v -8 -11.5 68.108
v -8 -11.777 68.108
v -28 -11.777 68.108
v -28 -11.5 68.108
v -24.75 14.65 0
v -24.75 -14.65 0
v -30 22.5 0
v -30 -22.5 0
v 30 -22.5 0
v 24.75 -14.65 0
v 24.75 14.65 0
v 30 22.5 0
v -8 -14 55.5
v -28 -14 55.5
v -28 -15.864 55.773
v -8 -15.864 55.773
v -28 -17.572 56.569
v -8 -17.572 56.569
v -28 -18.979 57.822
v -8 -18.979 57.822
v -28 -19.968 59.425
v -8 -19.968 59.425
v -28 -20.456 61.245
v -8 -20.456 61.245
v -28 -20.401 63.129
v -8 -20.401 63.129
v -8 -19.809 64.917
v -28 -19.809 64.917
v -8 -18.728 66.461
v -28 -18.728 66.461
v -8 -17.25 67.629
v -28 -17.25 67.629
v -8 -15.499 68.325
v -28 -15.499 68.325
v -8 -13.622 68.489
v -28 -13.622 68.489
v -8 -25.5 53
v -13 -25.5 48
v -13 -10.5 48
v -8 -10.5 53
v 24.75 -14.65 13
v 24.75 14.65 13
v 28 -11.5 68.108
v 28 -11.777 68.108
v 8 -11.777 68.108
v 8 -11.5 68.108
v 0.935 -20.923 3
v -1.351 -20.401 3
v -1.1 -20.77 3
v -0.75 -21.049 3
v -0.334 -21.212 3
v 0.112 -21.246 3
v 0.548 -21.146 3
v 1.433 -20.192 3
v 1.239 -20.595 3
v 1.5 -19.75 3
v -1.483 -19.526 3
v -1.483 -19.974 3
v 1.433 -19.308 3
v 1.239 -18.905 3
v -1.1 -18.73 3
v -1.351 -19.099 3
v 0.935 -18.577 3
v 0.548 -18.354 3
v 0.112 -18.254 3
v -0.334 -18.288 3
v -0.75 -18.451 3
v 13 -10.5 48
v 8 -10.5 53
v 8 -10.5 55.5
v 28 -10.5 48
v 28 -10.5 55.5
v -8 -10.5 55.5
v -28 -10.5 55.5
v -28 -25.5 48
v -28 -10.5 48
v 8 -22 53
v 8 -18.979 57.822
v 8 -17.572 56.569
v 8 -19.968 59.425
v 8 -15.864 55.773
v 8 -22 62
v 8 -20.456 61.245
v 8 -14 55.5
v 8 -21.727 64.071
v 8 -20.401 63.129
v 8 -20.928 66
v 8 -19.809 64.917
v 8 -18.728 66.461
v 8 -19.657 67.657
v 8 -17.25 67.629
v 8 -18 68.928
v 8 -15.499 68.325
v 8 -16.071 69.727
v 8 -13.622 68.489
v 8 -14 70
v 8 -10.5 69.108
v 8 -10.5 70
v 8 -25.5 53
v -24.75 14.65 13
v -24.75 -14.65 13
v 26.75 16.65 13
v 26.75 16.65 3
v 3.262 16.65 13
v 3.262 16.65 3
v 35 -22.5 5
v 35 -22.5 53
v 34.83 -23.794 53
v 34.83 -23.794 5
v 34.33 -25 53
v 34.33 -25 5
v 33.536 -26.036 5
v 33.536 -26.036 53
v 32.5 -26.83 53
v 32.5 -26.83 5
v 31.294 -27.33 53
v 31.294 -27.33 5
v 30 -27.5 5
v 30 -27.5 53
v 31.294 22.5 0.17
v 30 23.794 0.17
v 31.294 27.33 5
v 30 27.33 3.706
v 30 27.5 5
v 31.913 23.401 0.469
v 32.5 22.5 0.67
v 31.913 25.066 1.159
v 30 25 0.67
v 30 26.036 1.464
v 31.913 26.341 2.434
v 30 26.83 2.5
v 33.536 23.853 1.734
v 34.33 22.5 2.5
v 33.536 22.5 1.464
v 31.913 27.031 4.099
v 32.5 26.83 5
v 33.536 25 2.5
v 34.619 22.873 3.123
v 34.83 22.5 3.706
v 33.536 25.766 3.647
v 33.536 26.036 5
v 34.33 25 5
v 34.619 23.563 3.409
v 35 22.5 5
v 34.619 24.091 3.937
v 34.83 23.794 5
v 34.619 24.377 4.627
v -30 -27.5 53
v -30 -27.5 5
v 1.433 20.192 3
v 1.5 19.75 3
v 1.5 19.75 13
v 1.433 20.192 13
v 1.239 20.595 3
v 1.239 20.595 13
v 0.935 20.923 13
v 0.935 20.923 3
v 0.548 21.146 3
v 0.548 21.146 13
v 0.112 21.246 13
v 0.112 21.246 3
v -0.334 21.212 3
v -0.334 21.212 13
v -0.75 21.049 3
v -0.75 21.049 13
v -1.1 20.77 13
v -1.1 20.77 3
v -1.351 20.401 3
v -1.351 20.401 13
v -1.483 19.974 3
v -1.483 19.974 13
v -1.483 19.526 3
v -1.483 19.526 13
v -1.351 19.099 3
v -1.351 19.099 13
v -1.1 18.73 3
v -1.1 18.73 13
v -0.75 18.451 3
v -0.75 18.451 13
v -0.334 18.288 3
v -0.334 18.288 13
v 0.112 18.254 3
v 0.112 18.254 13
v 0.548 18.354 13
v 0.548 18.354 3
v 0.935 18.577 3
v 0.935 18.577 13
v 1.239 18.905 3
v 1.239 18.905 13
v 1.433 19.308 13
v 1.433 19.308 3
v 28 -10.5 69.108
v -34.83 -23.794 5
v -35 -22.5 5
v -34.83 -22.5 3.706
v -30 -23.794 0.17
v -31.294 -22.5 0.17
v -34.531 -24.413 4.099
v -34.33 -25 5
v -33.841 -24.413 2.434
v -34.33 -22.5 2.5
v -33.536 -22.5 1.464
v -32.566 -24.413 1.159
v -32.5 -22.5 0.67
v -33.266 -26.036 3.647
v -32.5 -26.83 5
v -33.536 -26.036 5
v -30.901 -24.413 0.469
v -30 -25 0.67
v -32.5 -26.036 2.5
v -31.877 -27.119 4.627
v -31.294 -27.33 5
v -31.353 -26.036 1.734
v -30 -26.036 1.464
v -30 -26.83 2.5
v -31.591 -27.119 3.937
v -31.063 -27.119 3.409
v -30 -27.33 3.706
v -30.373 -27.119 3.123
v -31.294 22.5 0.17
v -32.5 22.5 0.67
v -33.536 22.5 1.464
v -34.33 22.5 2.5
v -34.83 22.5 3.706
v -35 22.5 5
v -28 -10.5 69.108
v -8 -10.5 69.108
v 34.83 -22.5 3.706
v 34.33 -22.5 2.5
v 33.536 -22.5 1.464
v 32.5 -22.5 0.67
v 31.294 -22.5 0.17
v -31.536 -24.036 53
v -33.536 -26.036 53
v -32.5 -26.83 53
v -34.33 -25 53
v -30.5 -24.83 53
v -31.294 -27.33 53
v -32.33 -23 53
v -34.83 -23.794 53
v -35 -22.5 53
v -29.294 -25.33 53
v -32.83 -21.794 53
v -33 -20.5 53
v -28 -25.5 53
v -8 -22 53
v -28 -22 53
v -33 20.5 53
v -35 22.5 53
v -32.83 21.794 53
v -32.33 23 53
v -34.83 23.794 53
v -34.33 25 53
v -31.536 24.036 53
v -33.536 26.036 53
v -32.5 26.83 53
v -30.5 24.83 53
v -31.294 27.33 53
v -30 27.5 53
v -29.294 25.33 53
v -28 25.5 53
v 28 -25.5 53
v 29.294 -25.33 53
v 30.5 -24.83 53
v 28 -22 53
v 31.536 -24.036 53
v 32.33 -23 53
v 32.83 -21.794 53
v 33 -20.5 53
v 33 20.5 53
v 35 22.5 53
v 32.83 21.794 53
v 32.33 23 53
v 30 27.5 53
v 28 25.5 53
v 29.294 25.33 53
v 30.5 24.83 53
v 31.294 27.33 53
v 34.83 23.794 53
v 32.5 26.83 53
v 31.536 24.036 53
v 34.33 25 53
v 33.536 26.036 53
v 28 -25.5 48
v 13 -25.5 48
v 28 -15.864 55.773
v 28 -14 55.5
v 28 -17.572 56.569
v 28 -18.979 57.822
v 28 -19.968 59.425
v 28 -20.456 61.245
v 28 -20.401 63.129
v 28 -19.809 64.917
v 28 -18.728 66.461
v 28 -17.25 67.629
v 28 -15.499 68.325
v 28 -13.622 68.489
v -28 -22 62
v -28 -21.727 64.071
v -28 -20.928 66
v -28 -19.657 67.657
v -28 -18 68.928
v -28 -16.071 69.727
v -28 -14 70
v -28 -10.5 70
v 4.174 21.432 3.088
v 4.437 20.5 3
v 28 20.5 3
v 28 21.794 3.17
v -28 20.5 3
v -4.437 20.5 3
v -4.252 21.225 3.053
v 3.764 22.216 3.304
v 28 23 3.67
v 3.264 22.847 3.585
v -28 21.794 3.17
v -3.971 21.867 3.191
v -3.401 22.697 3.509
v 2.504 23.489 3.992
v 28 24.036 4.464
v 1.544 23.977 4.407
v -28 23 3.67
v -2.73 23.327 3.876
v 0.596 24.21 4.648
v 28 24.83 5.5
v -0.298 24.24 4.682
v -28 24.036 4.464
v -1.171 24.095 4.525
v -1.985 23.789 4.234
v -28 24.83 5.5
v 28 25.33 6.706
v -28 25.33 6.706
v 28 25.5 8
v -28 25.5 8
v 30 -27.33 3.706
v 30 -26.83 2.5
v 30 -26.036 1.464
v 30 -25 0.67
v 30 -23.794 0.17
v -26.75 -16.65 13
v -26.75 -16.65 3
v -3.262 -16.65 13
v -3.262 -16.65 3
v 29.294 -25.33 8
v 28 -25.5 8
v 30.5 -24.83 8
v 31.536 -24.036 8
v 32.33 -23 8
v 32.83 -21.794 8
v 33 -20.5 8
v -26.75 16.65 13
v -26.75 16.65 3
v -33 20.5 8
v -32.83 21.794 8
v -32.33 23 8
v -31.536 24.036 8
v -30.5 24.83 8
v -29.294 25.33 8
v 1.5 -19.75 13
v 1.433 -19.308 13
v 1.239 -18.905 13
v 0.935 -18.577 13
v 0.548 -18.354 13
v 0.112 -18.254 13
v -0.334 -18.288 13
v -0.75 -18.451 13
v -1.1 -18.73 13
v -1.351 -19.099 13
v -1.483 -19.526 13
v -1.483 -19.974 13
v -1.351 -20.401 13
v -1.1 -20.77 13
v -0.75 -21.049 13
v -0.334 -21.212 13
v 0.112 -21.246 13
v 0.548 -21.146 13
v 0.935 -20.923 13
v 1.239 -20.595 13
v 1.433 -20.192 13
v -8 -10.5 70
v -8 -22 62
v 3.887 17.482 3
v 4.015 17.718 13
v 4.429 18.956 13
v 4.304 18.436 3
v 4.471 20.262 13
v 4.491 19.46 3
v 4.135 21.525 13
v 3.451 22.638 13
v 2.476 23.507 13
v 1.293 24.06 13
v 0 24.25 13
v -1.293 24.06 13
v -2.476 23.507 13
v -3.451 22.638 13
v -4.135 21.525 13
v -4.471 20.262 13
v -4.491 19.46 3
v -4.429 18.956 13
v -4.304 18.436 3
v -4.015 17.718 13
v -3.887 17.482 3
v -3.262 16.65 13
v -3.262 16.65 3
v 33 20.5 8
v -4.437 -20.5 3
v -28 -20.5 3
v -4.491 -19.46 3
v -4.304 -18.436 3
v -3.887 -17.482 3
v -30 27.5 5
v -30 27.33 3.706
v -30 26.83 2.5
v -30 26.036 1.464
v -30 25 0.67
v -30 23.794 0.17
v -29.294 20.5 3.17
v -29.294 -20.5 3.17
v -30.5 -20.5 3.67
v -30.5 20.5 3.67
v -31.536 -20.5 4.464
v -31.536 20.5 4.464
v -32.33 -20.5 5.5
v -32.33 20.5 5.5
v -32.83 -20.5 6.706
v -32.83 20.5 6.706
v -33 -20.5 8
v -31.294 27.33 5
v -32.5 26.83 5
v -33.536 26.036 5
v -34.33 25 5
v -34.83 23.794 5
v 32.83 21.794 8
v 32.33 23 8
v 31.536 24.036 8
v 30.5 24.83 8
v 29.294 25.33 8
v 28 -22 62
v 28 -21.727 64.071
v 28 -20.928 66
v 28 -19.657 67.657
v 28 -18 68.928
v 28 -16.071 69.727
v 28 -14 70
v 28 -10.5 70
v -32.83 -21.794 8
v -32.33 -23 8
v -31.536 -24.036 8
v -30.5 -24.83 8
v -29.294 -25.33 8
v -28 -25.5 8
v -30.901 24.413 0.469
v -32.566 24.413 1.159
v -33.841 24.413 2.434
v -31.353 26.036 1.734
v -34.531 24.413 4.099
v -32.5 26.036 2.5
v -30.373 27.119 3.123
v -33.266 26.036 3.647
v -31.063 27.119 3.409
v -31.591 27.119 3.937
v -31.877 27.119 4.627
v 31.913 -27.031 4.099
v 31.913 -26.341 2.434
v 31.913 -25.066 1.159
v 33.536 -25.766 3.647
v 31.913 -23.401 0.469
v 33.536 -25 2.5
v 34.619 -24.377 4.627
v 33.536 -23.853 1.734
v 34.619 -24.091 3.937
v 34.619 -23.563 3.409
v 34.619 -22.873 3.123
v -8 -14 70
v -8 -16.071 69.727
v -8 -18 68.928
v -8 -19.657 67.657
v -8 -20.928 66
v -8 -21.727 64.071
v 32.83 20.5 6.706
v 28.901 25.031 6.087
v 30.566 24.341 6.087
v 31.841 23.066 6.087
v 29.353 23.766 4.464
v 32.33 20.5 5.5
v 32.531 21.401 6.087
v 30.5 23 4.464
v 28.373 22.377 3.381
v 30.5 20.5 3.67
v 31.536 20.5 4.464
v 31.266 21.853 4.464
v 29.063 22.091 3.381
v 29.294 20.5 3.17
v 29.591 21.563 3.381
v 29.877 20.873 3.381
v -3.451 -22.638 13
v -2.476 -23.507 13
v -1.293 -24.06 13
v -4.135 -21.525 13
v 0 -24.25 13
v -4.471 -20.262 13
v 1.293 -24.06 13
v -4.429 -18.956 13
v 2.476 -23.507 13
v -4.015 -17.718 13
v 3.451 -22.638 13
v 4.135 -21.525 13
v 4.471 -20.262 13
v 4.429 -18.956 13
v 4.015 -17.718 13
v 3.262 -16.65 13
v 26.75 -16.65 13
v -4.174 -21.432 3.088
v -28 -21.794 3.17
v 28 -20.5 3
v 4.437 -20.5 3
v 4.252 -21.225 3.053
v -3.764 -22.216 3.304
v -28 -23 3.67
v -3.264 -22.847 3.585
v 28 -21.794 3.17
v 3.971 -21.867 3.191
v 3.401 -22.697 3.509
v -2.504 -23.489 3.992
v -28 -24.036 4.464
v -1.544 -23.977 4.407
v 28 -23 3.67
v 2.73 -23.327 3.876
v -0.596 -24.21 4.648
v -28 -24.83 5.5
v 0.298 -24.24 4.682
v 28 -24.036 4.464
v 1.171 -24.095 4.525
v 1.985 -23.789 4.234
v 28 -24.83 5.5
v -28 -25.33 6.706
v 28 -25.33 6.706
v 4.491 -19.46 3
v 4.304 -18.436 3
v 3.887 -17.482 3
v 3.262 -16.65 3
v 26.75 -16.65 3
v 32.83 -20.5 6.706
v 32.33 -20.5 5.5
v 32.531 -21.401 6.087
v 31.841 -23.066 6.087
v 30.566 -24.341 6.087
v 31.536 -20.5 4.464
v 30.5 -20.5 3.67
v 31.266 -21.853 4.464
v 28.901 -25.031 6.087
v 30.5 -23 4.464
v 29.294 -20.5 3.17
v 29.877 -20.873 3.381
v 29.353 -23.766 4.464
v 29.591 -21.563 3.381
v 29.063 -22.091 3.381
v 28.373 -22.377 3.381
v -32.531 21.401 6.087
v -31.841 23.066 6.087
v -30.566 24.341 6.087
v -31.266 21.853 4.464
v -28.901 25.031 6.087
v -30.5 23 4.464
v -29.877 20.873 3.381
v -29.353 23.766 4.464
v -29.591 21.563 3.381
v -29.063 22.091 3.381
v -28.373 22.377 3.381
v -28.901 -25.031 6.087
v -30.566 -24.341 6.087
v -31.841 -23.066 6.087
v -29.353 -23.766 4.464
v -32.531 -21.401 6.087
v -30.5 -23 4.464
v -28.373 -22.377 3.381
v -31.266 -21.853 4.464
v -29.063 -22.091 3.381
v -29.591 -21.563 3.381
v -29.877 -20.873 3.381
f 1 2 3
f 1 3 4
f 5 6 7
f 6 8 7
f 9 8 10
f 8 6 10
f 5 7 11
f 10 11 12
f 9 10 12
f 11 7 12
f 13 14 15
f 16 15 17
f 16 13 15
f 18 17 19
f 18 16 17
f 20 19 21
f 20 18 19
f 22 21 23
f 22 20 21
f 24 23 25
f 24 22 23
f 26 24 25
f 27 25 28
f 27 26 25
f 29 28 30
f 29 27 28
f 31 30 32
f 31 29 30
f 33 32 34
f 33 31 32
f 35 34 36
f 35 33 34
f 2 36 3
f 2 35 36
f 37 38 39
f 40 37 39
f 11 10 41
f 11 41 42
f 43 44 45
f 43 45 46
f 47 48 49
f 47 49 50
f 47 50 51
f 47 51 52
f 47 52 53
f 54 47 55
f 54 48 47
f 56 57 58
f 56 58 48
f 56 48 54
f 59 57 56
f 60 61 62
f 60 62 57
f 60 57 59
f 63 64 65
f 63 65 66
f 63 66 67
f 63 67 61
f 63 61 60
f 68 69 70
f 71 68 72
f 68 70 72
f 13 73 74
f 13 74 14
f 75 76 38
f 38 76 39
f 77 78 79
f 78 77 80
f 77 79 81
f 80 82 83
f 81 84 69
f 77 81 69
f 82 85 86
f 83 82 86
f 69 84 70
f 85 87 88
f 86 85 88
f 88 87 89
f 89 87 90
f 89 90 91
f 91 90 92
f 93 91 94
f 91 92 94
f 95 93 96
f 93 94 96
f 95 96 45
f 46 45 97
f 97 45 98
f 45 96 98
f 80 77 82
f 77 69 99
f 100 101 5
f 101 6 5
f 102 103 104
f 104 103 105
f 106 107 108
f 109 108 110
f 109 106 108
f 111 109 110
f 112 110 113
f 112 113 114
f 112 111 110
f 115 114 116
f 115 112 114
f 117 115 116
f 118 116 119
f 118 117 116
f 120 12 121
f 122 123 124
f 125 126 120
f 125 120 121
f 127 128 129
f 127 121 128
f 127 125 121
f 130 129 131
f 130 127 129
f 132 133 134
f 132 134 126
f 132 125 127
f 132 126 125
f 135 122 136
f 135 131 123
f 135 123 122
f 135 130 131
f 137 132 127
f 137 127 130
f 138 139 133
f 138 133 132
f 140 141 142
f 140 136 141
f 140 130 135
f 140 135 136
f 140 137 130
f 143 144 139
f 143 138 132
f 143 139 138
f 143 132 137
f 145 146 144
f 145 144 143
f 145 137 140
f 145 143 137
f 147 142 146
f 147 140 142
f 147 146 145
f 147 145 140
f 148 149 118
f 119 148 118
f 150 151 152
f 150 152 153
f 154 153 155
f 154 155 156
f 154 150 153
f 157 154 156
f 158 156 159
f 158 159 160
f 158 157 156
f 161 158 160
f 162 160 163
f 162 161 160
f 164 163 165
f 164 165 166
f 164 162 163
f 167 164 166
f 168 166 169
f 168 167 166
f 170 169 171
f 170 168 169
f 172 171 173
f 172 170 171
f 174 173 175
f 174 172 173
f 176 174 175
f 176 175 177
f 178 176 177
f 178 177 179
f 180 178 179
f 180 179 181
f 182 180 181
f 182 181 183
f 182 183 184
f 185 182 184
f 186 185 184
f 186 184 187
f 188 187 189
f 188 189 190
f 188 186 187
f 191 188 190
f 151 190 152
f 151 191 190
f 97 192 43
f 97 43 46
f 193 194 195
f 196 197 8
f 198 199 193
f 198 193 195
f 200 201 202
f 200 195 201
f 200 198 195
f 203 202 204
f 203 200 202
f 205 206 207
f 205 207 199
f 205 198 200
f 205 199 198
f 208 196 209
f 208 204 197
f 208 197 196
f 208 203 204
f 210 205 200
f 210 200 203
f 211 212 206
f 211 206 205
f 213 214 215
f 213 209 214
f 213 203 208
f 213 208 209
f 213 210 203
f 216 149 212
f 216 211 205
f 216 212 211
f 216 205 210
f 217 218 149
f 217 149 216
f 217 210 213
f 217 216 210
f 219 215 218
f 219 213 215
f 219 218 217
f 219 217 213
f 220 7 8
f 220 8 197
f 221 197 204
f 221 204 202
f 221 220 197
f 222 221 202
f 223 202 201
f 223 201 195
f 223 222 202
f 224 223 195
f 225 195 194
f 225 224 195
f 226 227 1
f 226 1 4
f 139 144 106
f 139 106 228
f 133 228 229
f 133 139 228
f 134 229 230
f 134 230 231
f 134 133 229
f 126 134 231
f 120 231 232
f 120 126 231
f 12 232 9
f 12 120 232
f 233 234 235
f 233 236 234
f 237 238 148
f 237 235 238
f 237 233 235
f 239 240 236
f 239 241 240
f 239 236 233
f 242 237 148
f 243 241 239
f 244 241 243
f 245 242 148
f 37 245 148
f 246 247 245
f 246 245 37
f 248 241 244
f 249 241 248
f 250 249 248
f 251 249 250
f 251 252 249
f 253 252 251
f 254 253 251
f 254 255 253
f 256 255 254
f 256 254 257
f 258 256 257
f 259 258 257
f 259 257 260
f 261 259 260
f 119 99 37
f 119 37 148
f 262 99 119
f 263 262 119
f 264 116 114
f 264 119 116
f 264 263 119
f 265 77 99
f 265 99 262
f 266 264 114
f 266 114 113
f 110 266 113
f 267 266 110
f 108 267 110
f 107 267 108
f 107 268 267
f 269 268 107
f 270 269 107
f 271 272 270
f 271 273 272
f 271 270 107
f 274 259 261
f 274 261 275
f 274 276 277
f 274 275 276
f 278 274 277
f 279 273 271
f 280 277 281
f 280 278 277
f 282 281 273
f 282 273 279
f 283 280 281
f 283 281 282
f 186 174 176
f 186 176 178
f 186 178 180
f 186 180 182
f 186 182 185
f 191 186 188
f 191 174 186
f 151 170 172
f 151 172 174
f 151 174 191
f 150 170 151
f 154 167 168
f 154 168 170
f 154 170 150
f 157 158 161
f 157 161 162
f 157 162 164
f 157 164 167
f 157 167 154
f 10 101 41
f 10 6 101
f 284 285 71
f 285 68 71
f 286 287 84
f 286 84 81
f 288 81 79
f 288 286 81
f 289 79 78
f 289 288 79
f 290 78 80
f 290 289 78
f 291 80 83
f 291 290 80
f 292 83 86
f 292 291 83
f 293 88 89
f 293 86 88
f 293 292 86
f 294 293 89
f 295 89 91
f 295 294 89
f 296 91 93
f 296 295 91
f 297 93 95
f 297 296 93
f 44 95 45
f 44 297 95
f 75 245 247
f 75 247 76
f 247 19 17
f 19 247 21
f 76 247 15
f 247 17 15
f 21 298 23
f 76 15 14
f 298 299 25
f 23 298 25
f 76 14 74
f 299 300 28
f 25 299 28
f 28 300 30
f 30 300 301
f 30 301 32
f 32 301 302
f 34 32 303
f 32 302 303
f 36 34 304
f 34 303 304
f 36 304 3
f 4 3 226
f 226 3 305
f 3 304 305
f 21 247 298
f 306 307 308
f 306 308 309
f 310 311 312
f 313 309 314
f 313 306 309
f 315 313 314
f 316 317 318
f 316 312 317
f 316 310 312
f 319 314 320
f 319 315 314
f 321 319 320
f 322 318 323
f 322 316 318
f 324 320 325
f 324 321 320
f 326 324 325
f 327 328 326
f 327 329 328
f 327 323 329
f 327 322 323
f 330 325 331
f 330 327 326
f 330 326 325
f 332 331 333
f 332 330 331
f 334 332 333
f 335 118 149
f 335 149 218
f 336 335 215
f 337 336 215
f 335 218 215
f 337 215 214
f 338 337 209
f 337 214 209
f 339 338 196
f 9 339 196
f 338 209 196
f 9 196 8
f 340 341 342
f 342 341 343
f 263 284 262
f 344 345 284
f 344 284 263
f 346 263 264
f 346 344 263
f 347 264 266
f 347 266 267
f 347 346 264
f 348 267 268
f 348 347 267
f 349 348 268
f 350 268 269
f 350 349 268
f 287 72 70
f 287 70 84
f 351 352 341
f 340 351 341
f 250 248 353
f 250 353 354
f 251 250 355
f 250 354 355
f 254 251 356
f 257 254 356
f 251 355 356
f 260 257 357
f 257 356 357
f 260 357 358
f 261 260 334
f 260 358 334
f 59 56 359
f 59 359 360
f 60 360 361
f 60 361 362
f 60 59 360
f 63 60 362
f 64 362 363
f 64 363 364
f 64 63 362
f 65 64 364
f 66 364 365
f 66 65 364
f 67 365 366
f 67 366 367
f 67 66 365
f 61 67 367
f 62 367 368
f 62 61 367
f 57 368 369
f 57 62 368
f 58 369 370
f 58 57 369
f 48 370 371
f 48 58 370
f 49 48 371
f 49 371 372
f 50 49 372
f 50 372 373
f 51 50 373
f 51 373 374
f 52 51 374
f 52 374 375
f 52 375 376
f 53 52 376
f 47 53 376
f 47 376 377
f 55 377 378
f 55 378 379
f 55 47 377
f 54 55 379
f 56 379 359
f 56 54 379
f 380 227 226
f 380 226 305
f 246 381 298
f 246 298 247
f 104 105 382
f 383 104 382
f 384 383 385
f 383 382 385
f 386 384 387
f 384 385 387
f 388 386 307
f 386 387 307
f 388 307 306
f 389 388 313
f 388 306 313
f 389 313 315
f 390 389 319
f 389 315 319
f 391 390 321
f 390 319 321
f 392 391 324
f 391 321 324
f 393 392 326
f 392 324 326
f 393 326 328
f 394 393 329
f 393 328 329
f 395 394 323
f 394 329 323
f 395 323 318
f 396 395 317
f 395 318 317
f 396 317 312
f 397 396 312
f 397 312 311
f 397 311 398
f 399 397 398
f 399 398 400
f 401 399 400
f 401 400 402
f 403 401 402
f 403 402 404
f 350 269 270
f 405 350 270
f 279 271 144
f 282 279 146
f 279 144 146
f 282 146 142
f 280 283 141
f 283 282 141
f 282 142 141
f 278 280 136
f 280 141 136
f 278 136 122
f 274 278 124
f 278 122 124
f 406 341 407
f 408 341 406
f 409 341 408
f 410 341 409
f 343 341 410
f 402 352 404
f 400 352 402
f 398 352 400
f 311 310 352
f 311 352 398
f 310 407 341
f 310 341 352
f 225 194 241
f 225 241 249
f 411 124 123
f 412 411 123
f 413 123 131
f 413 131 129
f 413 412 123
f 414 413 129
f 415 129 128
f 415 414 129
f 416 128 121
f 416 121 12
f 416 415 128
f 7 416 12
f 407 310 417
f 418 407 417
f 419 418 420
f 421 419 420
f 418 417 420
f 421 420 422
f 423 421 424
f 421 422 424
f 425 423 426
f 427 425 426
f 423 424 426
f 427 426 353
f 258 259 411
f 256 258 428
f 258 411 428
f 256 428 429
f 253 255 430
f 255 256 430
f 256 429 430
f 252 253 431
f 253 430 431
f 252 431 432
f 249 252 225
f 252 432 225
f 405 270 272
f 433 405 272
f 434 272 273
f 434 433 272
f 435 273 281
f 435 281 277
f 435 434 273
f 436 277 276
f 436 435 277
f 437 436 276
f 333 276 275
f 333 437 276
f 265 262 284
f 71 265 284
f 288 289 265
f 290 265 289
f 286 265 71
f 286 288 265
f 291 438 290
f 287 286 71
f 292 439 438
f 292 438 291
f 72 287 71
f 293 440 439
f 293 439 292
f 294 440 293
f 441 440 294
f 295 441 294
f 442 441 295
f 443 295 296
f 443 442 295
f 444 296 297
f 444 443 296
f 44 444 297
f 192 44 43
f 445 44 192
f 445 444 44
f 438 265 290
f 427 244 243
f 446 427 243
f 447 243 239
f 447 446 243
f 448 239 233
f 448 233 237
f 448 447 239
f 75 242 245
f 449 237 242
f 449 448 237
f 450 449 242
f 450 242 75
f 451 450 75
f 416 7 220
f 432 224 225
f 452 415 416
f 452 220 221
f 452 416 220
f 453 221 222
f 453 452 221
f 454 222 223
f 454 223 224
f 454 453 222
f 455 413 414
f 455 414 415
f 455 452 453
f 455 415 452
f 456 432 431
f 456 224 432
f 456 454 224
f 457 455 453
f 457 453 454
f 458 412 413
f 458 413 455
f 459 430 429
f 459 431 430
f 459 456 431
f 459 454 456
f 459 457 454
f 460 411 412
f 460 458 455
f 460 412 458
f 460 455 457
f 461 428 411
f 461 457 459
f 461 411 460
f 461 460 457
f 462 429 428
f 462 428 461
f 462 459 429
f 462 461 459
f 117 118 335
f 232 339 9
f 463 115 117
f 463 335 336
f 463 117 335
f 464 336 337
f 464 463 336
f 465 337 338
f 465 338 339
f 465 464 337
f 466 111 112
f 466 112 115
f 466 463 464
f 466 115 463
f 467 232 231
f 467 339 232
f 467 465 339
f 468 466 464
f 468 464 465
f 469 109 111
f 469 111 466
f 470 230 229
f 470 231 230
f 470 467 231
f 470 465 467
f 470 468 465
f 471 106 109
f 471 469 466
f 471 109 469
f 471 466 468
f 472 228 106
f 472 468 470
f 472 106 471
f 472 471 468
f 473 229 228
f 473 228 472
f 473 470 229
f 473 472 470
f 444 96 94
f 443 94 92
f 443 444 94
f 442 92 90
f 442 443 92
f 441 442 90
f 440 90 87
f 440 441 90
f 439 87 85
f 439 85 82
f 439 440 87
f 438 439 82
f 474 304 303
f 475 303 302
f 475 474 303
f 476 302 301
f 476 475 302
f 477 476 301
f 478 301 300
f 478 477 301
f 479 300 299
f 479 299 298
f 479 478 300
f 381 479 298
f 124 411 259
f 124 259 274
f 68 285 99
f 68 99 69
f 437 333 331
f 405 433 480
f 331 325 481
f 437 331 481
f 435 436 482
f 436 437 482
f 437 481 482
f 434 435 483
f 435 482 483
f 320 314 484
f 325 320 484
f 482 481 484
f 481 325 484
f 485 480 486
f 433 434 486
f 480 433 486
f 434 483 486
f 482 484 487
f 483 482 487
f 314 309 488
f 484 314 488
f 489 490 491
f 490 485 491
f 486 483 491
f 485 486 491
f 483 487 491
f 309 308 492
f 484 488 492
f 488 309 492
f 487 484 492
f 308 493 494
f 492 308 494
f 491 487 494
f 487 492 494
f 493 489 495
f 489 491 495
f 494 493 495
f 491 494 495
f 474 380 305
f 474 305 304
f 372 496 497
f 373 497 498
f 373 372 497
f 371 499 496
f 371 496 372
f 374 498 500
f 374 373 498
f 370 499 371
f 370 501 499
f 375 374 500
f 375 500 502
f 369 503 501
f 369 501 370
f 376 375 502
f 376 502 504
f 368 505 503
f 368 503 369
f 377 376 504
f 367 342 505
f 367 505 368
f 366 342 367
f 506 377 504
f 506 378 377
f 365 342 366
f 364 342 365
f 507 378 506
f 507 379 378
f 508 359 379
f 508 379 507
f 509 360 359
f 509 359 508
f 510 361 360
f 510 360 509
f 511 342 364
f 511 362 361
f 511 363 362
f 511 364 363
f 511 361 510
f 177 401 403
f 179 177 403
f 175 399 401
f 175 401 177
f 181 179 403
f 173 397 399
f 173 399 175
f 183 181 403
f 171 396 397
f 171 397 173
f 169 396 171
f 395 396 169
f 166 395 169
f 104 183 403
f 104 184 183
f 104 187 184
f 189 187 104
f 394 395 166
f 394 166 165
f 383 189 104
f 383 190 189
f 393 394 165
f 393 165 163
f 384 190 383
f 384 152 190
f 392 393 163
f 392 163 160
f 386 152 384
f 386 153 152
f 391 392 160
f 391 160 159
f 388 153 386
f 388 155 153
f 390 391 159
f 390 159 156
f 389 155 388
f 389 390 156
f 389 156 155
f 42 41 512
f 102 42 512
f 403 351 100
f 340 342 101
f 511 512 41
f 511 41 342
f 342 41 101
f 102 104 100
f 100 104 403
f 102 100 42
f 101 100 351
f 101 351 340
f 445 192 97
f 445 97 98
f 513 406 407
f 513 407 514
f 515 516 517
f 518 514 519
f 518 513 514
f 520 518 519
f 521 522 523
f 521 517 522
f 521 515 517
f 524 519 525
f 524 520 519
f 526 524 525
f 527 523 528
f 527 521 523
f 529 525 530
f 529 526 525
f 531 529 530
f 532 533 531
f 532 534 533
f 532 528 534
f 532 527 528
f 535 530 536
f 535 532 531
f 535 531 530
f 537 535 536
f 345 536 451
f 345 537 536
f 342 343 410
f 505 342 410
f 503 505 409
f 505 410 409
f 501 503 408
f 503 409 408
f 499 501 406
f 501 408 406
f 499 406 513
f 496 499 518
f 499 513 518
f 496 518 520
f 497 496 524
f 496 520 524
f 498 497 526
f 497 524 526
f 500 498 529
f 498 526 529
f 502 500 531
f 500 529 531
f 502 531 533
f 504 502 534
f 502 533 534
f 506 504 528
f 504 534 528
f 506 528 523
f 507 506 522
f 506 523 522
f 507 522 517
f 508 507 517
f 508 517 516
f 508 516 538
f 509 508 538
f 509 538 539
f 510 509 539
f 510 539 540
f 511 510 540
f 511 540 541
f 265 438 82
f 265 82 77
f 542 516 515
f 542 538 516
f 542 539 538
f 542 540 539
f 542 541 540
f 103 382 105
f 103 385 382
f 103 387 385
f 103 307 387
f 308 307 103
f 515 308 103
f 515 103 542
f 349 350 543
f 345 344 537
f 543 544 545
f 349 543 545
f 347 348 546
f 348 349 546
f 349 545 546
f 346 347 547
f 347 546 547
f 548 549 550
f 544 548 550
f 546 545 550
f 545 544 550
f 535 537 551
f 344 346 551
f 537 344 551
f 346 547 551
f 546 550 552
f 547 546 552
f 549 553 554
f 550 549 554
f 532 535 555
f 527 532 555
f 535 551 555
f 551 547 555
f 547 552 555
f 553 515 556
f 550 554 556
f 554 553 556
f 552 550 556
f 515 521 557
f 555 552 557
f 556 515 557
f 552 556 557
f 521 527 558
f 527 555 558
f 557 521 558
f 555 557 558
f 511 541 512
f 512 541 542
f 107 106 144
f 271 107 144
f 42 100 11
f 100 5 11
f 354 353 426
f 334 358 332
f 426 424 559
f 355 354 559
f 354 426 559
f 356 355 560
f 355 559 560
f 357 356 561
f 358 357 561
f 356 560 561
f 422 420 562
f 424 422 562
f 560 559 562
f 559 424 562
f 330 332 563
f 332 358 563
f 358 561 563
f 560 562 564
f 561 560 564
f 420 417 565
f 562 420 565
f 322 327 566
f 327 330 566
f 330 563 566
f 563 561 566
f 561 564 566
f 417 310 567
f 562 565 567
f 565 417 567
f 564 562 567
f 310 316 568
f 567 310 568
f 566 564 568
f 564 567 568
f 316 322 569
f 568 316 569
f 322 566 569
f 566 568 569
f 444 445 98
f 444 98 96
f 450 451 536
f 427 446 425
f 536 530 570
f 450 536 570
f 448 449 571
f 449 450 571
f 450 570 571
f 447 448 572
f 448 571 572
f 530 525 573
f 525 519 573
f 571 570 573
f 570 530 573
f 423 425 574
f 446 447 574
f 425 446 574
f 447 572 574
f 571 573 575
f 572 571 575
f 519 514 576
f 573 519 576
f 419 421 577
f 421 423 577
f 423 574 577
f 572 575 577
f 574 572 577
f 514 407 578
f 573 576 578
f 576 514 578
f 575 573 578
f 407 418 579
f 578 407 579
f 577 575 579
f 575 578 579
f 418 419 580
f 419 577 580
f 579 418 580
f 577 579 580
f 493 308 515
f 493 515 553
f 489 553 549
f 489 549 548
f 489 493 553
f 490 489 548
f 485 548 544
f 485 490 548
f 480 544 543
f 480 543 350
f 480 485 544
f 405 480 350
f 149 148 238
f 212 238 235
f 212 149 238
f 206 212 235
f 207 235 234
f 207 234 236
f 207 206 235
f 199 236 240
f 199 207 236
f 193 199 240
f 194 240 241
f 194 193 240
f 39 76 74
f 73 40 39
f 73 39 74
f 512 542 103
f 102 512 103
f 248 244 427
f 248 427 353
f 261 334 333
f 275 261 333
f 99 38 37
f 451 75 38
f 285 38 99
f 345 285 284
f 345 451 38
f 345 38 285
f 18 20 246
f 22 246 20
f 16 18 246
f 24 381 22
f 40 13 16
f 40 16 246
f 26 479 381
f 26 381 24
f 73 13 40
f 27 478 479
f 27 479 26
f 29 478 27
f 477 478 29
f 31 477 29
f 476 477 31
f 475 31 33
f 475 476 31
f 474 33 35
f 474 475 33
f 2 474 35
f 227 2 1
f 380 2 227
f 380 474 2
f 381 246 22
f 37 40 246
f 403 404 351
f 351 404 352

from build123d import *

# Parameters (mm, degrees)
F0_W         = 70
F0_H         = 55
F0_W_2       = 49.5
F0_H_2       = 29.3
F1_DEPTH     = 3
F2_R         = 1.5
F2_W         = 49.5
F2_H         = 29.3
F3_DEPTH     = 10
F2_W_2       = 70
F2_H_2       = 55
F2_W_3       = 66
F2_H_3       = 51
F4_DEPTH     = 50
F5_T1_DEPTH  = 45
F5_T3_DEPTH  = 41
F5_S7_W      = 5.1
F5_S7_H      = 5.1
F5_T8_DEPTH  = 5.1
F5_S13_W     = 5.1
F5_S13_H     = 5.1
F5_T14_DEPTH = 5.1
F5_S19_W     = 5.1
F5_S19_H     = 5.1
F5_T20_DEPTH = 5.1
F5_S25_W     = 5.1
F5_S25_H     = 5.1
F5_T26_DEPTH = 5.1
F5_T32_DEPTH = 56
F5_S33_R     = 4.5
F5_T34_DEPTH = 30
F5_T38_DEPTH = 56
F5_S39_R     = 4.5
F5_T40_DEPTH = 30
F5_T41_DEPTH = 45
F5_T43_DEPTH = 60.5
F5_T45_DEPTH = 60
F5_S49_W     = 5.1
F5_S49_H     = 5.1
F5_T50_DEPTH = 5.1
F5_S55_W     = 5.1
F5_S55_H     = 5.1
F5_T56_DEPTH = 5.1
F5_S61_W     = 5.1
F5_S61_H     = 5.1
F5_T62_DEPTH = 5.1
F5_S67_W     = 5.1
F5_S67_H     = 5.1
F5_T68_DEPTH = 5.1
F6_W         = 20
F6_H         = 15
F7_DEPTH     = 2
F9_DEPTH     = 56
F10_W        = 16
F10_H        = 9
F10_H_2      = 13.2445012331
F11_DEPTH    = 25
F12_DEPTH    = 3
F13_SIZE     = 4.99999
F14_SIZE     = 1


# Not quite as in the source:
# - a fillet or chamfer that OpenCascade refuses, or shapes differently, is made with other operations: its cross-section is extruded or revolved along the edge and cut away or added
# - a fillet or chamfer is up to 0.001 mm smaller than in the source, because OpenCascade refuses the exact size


with BuildPart() as f1:
    # F0 (on Top) → F1 (new body)
    with BuildSketch(Plane.XY):
        Rectangle(F0_W, F0_H)
        Rectangle(F0_W_2, F0_H_2, mode=Mode.SUBTRACT)
    extrude(amount=F1_DEPTH)

    # F2 (on face) → F3 (join)
    with BuildSketch(Plane.XY.offset(3)):
        with BuildLine():
            Line((-3.2619012861, 16.65), (-26.75, 16.65))
            Line((-26.75, 16.65), (-26.75, -16.65))
            Line((-26.75, -16.65), (-3.2619012861, -16.65))
            ThreePointArc((-3.2619012861, -16.65), (0, -24.25), (3.2619012861, -16.65))
            Line((3.2619012861, -16.65), (26.75, -16.65))
            Line((26.75, -16.65), (26.75, 16.65))
            Line((26.75, 16.65), (3.2619012861, 16.65))
            ThreePointArc((3.2619012861, 16.65), (0, 24.25), (-3.2619012861, 16.65))
        make_face()
        with Locations((0, -19.75)):
            Circle(F2_R, mode=Mode.SUBTRACT)
        Rectangle(F2_W, F2_H, mode=Mode.SUBTRACT)
        with Locations((0, 19.75)):
            Circle(F2_R, mode=Mode.SUBTRACT)
    extrude(amount=F3_DEPTH)

    # F2 (on face) → F4 (join)
    with BuildSketch(Plane.XY.offset(3)):
        Rectangle(F2_W_2, F2_H_2)
        Rectangle(F2_W_3, F2_H_3, mode=Mode.SUBTRACT)
    extrude(amount=F4_DEPTH)

    # F5: fillet of radius 5 on 16 edges, made by hand

    # F5_s2 → F5_t1 (join)
    with BuildSketch(Plane.XY.offset(8)):
        with BuildLine():
            ThreePointArc((-33, 20.5), (-31.5355339059, 24.0355339059), (-28, 25.5))
            Line((-28, 25.5), (-33, 25.5))
            Line((-33, 25.5), (-33, 20.5))
        make_face()
        with BuildLine():
            ThreePointArc((33, 20.5), (31.5355339059, 24.0355339059), (28, 25.5))
            Line((28, 25.5), (33, 25.5))
            Line((33, 25.5), (33, 20.5))
        make_face()
        with BuildLine():
            ThreePointArc((-33, -20.5), (-31.5355339059, -24.0355339059), (-28, -25.5))
            Line((-28, -25.5), (-33, -25.5))
            Line((-33, -25.5), (-33, -20.5))
        make_face()
        with BuildLine():
            ThreePointArc((28, -25.5), (31.5355339059, -24.0355339059), (33, -20.5))
            Line((33, -20.5), (33, -25.5))
            Line((33, -25.5), (28, -25.5))
        make_face()
    extrude(amount=F5_T1_DEPTH)

    # F5_s4 → F5_t3 (join)
    with BuildSketch(Plane.XZ.offset(-20.5)):
        with BuildLine():
            ThreePointArc((-28, 3), (-31.5355339059, 4.4644660941), (-33, 8))
            Line((-33, 8), (-33, 3))
            Line((-33, 3), (-28, 3))
        make_face()
        with BuildLine():
            ThreePointArc((28, 3), (31.5355339059, 4.4644660941), (33, 8))
            Line((33, 8), (33, 3))
            Line((33, 3), (28, 3))
        make_face()
    extrude(amount=F5_T3_DEPTH)


with BuildPart() as f5_tool6:
    # F5_s7 → F5_t8 (new body)
    with BuildSketch(Plane.XY.offset(8)):
        with Locations((-30.55, 23.05)):
            Rectangle(F5_S7_W, F5_S7_H)
    extrude(amount=-F5_T8_DEPTH)

    # F5_s9 → F5_t10 (revolve, cut)
    with BuildSketch(Plane(origin=(-28, 20.5, 8), x_dir=(0.7071067812, -0.7071067812, 0), z_dir=(0.7071067812, 0.7071067812, 0))):
        with BuildLine():
            ThreePointArc((0, -5), (5, 0), (0, 5))
            Line((0, 5), (0, -5))
        make_face()
    revolve(axis=Axis((-28, 20.5, 8), (0, 0, -1)), mode=Mode.SUBTRACT)


with BuildPart() as f1_1:
    add(f1.part)

    # F5_t5: union F5_tool6
    add(f5_tool6.part)


with BuildPart() as f5_tool12:
    # F5_s13 → F5_t14 (new body)
    with BuildSketch(Plane.XY.offset(8)):
        with Locations((30.55, 23.05)):
            Rectangle(F5_S13_W, F5_S13_H)
    extrude(amount=-F5_T14_DEPTH)

    # F5_s15 → F5_t16 (revolve, cut)
    with BuildSketch(Plane(origin=(28, 20.5, 8), x_dir=(-0.7071067812, -0.7071067812, 0), z_dir=(0.7071067812, -0.7071067812, 0))):
        with BuildLine():
            ThreePointArc((0, -5), (5, 0), (0, 5))
            Line((0, 5), (0, -5))
        make_face()
    revolve(axis=Axis((28, 20.5, 8), (0, 0, -1)), mode=Mode.SUBTRACT)


with BuildPart() as f1_2:
    add(f1_1.part)

    # F5_t11: union F5_tool12
    add(f5_tool12.part)


with BuildPart() as f5_tool18:
    # F5_s19 → F5_t20 (new body)
    with BuildSketch(Plane.XY.offset(8)):
        with Locations((-30.55, -23.05)):
            Rectangle(F5_S19_W, F5_S19_H)
    extrude(amount=-F5_T20_DEPTH)

    # F5_s21 → F5_t22 (revolve, cut)
    with BuildSketch(Plane(origin=(-28, -20.5, 8), x_dir=(0.7071067812, 0.7071067812, 0), z_dir=(-0.7071067812, 0.7071067812, 0))):
        with BuildLine():
            ThreePointArc((0, -5), (5, 0), (0, 5))
            Line((0, 5), (0, -5))
        make_face()
    revolve(axis=Axis((-28, -20.5, 8), (0, 0, -1)), mode=Mode.SUBTRACT)


with BuildPart() as f1_3:
    add(f1_2.part)

    # F5_t17: union F5_tool18
    add(f5_tool18.part)


with BuildPart() as f5_tool24:
    # F5_s25 → F5_t26 (new body)
    with BuildSketch(Plane.XY.offset(8)):
        with Locations((30.55, -23.05)):
            Rectangle(F5_S25_W, F5_S25_H)
    extrude(amount=-F5_T26_DEPTH)

    # F5_s27 → F5_t28 (revolve, cut)
    with BuildSketch(Plane(origin=(28, -20.5, 8), x_dir=(-0.7071067812, 0.7071067812, 0), z_dir=(-0.7071067812, -0.7071067812, 0))):
        with BuildLine():
            ThreePointArc((0, -5), (5, 0), (0, 5))
            Line((0, 5), (0, -5))
        make_face()
    revolve(axis=Axis((28, -20.5, 8), (0, 0, -1)), mode=Mode.SUBTRACT)


with BuildPart() as f1_4:
    add(f1_3.part)

    # F5_t23: union F5_tool24
    add(f5_tool24.part)


with BuildPart() as f5_tool30:
    # F5_s31 → F5_t32 (new body)
    with BuildSketch(Plane.YZ.offset(-28)):
        with BuildLine():
            ThreePointArc((20.5, 3), (24.0355339059, 4.4644660941), (25.5, 8))
            Line((25.5, 8), (25.5, 3))
            Line((25.5, 3), (20.5, 3))
        make_face()
    extrude(amount=F5_T32_DEPTH)

    # F5_s33 → F5_t34 (cut, symmetric)
    with BuildSketch(Plane.XY.offset(5.5)):
        with Locations((0, 19.75)):
            Circle(F5_S33_R)
    extrude(amount=F5_T34_DEPTH, both=True, mode=Mode.SUBTRACT)


with BuildPart() as f1_5:
    add(f1_4.part)

    # F5_t29: union F5_tool30
    add(f5_tool30.part)


with BuildPart() as f5_tool36:
    # F5_s37 → F5_t38 (new body)
    with BuildSketch(Plane.YZ.offset(28)):
        with BuildLine():
            ThreePointArc((-20.5, 3), (-24.0355339059, 4.4644660941), (-25.5, 8))
            Line((-25.5, 8), (-25.5, 3))
            Line((-25.5, 3), (-20.5, 3))
        make_face()
    extrude(amount=-F5_T38_DEPTH)

    # F5_s39 → F5_t40 (cut, symmetric)
    with BuildSketch(Plane.XY.offset(5.5)):
        with Locations((0, -19.75)):
            Circle(F5_S39_R)
    extrude(amount=F5_T40_DEPTH, both=True, mode=Mode.SUBTRACT)


with BuildPart() as f1_6:
    add(f1_5.part)

    # F5_t35: union F5_tool36
    add(f5_tool36.part)

    # F5_s42 → F5_t41 (cut)
    with BuildSketch(Plane.XZ.offset(-22.5)):
        with BuildLine():
            ThreePointArc((-30, 0), (-33.5355339059, 1.4644660941), (-35, 5))
            Line((-35, 5), (-35, 0))
            Line((-35, 0), (-30, 0))
        make_face()
        with BuildLine():
            ThreePointArc((35, 5), (33.5355339059, 1.4644660941), (30, 0))
            Line((30, 0), (35, 0))
            Line((35, 0), (35, 5))
        make_face()
    extrude(amount=F5_T41_DEPTH, mode=Mode.SUBTRACT)

    # F5_s44 → F5_t43 (cut)
    with BuildSketch(Plane.XY.offset(5)):
        with BuildLine():
            ThreePointArc((-30, 27.5), (-33.5355339059, 26.0355339059), (-35, 22.5))
            Line((-35, 22.5), (-35, 27.5))
            Line((-35, 27.5), (-30, 27.5))
        make_face()
        with BuildLine():
            ThreePointArc((-30, -27.5), (-33.5355339059, -26.0355339059), (-35, -22.5))
            Line((-35, -22.5), (-35, -27.5))
            Line((-35, -27.5), (-30, -27.5))
        make_face()
        with BuildLine():
            ThreePointArc((35, 22.5), (33.5355339059, 26.0355339059), (30, 27.5))
            Line((30, 27.5), (35, 27.5))
            Line((35, 27.5), (35, 22.5))
        make_face()
        with BuildLine():
            ThreePointArc((35, -22.5), (33.5355339059, -26.0355339059), (30, -27.5))
            Line((30, -27.5), (35, -27.5))
            Line((35, -27.5), (35, -22.5))
        make_face()
    extrude(amount=F5_T43_DEPTH, mode=Mode.SUBTRACT)

    # F5_s46 → F5_t45 (cut)
    with BuildSketch(Plane.YZ.offset(-30)):
        with BuildLine():
            ThreePointArc((27.5, 5), (26.0355339059, 1.4644660941), (22.5, 0))
            Line((22.5, 0), (27.5, 0))
            Line((27.5, 0), (27.5, 5))
        make_face()
        with BuildLine():
            ThreePointArc((-27.5, 5), (-26.0355339059, 1.4644660941), (-22.5, 0))
            Line((-22.5, 0), (-27.5, 0))
            Line((-27.5, 0), (-27.5, 5))
        make_face()
    extrude(amount=F5_T45_DEPTH, mode=Mode.SUBTRACT)


with BuildPart() as f5_tool48:
    # F5_s49 → F5_t50 (new body)
    with BuildSketch(Plane.XZ.offset(-22.5)):
        with Locations((-32.55, 2.45)):
            Rectangle(F5_S49_W, F5_S49_H)
    extrude(amount=-F5_T50_DEPTH)

    # F5_s51 → F5_t52 (revolve, cut)
    with BuildSketch(Plane(origin=(-30, 22.5, 5), x_dir=(0.7071067812, 0, 0.7071067812), z_dir=(-0.7071067812, 0, 0.7071067812))):
        with BuildLine():
            ThreePointArc((0, -5), (5, 0), (0, 5))
            Line((0, 5), (0, -5))
        make_face()
    revolve(axis=Axis((-30, 22.5, 5), (0, 1, 0)), mode=Mode.SUBTRACT)


with BuildPart() as f1_7:
    add(f1_6.part)

    # F5_t47: cut F5_tool48
    add(f5_tool48.part, mode=Mode.SUBTRACT)


with BuildPart() as f5_tool54:
    # F5_s55 → F5_t56 (new body)
    with BuildSketch(Plane.XZ.offset(22.5)):
        with Locations((-32.55, 2.45)):
            Rectangle(F5_S55_W, F5_S55_H)
    extrude(amount=F5_T56_DEPTH)

    # F5_s57 → F5_t58 (revolve, cut)
    with BuildSketch(Plane(origin=(-30, -22.5, 5), x_dir=(0.7071067812, 0, 0.7071067812), z_dir=(0.7071067812, 0, -0.7071067812))):
        with BuildLine():
            ThreePointArc((0, -5), (5, 0), (0, 5))
            Line((0, 5), (0, -5))
        make_face()
    revolve(axis=Axis((-30, -22.5, 5), (0, -1, 0)), mode=Mode.SUBTRACT)


with BuildPart() as f1_8:
    add(f1_7.part)

    # F5_t53: cut F5_tool54
    add(f5_tool54.part, mode=Mode.SUBTRACT)


with BuildPart() as f5_tool60:
    # F5_s61 → F5_t62 (new body)
    with BuildSketch(Plane.YZ.offset(30)):
        with Locations((25.05, 2.45)):
            Rectangle(F5_S61_W, F5_S61_H)
    extrude(amount=F5_T62_DEPTH)

    # F5_s63 → F5_t64 (revolve, cut)
    with BuildSketch(Plane(origin=(30, 22.5, 5), x_dir=(0, -0.7071067812, 0.7071067812), z_dir=(0, 0.7071067812, 0.7071067812))):
        with BuildLine():
            ThreePointArc((0, -5), (5, 0), (0, 5))
            Line((0, 5), (0, -5))
        make_face()
    revolve(axis=Axis((30, 22.5, 5), (1, 0, 0)), mode=Mode.SUBTRACT)


with BuildPart() as f1_9:
    add(f1_8.part)

    # F5_t59: cut F5_tool60
    add(f5_tool60.part, mode=Mode.SUBTRACT)


with BuildPart() as f5_tool66:
    # F5_s67 → F5_t68 (new body)
    with BuildSketch(Plane.YZ.offset(30)):
        with Locations((-25.05, 2.45)):
            Rectangle(F5_S67_W, F5_S67_H)
    extrude(amount=F5_T68_DEPTH)

    # F5_s69 → F5_t70 (revolve, cut)
    with BuildSketch(Plane(origin=(30, -22.5, 5), x_dir=(0, 0.7071067812, 0.7071067812), z_dir=(0, 0.7071067812, -0.7071067812))):
        with BuildLine():
            ThreePointArc((0, -5), (5, 0), (0, 5))
            Line((0, 5), (0, -5))
        make_face()
    revolve(axis=Axis((30, -22.5, 5), (1, 0, 0)), mode=Mode.SUBTRACT)


with BuildPart() as f1_10:
    add(f1_9.part)

    # F5_t65: cut F5_tool66
    add(f5_tool66.part, mode=Mode.SUBTRACT)

    # F6 (on face) → F7 (join)
    with BuildSketch(Plane.XY.offset(53)):
        with Locations((18, -18)):
            Rectangle(F6_W, F6_H)
        with Locations((-18, -18)):
            Rectangle(F6_W, F6_H)
    extrude(amount=-F7_DEPTH)

    # F8 (on face) → F9 (join)
    with BuildSketch(Plane.YZ.offset(28)):
        with BuildLine():
            ThreePointArc((-14, 55.5), (-20.4012503946, 63.1287131548), (-11.7768690684, 68.1080020351))
            Line((-11.7768690684, 68.1080020351), (-10.5, 68.1080020351))
            Line((-10.5, 68.1080020351), (-10.5, 70))
            Line((-10.5, 70), (-14, 70))
            ThreePointArc((-14, 70), (-19.6568542495, 67.6568542495), (-22, 62))
            Line((-22, 62), (-22, 53))
            Line((-22, 53), (-10.5, 53))
            Line((-10.5, 53), (-10.5, 55.5))
            Line((-10.5, 55.5), (-14, 55.5))
        make_face()
    extrude(amount=-F9_DEPTH)

    # F10 (on face) → F11 (cut)
    with BuildSketch(Plane.XZ.offset(22)):
        with Locations((0, 57.5)):
            Rectangle(F10_W, F10_H)
        with Locations((0, 68.6222506166)):
            Rectangle(F10_W, F10_H_2)
    extrude(amount=-F11_DEPTH, mode=Mode.SUBTRACT)

    # F12 (add): faces of the model
    f12_faces = [f1_10.faces().sort_by_distance(p)[0] for p in [
        (18, -18, 51),
        (-18, -18, 51),
    ]]
    extrude(f12_faces, amount=F12_DEPTH)

    # F13 (size 5 in the source; OpenCascade refuses exactly that, so slightly less here)
    f13_edges = [f1_10.edges().sort_by_distance(p)[0] for p in [
        (-8, -18, 48),
        (8, -18, 48),
    ]]
    chamfer(f13_edges, length=F13_SIZE)

    # F14
    f14_edges = [f1_10.edges().sort_by_distance(p)[0] for p in [
        (18, -10.5, 68.108002),
        (-18, -10.5, 68.108002),
    ]]
    chamfer(f14_edges, length=F14_SIZE)


solid = f1_10.part
